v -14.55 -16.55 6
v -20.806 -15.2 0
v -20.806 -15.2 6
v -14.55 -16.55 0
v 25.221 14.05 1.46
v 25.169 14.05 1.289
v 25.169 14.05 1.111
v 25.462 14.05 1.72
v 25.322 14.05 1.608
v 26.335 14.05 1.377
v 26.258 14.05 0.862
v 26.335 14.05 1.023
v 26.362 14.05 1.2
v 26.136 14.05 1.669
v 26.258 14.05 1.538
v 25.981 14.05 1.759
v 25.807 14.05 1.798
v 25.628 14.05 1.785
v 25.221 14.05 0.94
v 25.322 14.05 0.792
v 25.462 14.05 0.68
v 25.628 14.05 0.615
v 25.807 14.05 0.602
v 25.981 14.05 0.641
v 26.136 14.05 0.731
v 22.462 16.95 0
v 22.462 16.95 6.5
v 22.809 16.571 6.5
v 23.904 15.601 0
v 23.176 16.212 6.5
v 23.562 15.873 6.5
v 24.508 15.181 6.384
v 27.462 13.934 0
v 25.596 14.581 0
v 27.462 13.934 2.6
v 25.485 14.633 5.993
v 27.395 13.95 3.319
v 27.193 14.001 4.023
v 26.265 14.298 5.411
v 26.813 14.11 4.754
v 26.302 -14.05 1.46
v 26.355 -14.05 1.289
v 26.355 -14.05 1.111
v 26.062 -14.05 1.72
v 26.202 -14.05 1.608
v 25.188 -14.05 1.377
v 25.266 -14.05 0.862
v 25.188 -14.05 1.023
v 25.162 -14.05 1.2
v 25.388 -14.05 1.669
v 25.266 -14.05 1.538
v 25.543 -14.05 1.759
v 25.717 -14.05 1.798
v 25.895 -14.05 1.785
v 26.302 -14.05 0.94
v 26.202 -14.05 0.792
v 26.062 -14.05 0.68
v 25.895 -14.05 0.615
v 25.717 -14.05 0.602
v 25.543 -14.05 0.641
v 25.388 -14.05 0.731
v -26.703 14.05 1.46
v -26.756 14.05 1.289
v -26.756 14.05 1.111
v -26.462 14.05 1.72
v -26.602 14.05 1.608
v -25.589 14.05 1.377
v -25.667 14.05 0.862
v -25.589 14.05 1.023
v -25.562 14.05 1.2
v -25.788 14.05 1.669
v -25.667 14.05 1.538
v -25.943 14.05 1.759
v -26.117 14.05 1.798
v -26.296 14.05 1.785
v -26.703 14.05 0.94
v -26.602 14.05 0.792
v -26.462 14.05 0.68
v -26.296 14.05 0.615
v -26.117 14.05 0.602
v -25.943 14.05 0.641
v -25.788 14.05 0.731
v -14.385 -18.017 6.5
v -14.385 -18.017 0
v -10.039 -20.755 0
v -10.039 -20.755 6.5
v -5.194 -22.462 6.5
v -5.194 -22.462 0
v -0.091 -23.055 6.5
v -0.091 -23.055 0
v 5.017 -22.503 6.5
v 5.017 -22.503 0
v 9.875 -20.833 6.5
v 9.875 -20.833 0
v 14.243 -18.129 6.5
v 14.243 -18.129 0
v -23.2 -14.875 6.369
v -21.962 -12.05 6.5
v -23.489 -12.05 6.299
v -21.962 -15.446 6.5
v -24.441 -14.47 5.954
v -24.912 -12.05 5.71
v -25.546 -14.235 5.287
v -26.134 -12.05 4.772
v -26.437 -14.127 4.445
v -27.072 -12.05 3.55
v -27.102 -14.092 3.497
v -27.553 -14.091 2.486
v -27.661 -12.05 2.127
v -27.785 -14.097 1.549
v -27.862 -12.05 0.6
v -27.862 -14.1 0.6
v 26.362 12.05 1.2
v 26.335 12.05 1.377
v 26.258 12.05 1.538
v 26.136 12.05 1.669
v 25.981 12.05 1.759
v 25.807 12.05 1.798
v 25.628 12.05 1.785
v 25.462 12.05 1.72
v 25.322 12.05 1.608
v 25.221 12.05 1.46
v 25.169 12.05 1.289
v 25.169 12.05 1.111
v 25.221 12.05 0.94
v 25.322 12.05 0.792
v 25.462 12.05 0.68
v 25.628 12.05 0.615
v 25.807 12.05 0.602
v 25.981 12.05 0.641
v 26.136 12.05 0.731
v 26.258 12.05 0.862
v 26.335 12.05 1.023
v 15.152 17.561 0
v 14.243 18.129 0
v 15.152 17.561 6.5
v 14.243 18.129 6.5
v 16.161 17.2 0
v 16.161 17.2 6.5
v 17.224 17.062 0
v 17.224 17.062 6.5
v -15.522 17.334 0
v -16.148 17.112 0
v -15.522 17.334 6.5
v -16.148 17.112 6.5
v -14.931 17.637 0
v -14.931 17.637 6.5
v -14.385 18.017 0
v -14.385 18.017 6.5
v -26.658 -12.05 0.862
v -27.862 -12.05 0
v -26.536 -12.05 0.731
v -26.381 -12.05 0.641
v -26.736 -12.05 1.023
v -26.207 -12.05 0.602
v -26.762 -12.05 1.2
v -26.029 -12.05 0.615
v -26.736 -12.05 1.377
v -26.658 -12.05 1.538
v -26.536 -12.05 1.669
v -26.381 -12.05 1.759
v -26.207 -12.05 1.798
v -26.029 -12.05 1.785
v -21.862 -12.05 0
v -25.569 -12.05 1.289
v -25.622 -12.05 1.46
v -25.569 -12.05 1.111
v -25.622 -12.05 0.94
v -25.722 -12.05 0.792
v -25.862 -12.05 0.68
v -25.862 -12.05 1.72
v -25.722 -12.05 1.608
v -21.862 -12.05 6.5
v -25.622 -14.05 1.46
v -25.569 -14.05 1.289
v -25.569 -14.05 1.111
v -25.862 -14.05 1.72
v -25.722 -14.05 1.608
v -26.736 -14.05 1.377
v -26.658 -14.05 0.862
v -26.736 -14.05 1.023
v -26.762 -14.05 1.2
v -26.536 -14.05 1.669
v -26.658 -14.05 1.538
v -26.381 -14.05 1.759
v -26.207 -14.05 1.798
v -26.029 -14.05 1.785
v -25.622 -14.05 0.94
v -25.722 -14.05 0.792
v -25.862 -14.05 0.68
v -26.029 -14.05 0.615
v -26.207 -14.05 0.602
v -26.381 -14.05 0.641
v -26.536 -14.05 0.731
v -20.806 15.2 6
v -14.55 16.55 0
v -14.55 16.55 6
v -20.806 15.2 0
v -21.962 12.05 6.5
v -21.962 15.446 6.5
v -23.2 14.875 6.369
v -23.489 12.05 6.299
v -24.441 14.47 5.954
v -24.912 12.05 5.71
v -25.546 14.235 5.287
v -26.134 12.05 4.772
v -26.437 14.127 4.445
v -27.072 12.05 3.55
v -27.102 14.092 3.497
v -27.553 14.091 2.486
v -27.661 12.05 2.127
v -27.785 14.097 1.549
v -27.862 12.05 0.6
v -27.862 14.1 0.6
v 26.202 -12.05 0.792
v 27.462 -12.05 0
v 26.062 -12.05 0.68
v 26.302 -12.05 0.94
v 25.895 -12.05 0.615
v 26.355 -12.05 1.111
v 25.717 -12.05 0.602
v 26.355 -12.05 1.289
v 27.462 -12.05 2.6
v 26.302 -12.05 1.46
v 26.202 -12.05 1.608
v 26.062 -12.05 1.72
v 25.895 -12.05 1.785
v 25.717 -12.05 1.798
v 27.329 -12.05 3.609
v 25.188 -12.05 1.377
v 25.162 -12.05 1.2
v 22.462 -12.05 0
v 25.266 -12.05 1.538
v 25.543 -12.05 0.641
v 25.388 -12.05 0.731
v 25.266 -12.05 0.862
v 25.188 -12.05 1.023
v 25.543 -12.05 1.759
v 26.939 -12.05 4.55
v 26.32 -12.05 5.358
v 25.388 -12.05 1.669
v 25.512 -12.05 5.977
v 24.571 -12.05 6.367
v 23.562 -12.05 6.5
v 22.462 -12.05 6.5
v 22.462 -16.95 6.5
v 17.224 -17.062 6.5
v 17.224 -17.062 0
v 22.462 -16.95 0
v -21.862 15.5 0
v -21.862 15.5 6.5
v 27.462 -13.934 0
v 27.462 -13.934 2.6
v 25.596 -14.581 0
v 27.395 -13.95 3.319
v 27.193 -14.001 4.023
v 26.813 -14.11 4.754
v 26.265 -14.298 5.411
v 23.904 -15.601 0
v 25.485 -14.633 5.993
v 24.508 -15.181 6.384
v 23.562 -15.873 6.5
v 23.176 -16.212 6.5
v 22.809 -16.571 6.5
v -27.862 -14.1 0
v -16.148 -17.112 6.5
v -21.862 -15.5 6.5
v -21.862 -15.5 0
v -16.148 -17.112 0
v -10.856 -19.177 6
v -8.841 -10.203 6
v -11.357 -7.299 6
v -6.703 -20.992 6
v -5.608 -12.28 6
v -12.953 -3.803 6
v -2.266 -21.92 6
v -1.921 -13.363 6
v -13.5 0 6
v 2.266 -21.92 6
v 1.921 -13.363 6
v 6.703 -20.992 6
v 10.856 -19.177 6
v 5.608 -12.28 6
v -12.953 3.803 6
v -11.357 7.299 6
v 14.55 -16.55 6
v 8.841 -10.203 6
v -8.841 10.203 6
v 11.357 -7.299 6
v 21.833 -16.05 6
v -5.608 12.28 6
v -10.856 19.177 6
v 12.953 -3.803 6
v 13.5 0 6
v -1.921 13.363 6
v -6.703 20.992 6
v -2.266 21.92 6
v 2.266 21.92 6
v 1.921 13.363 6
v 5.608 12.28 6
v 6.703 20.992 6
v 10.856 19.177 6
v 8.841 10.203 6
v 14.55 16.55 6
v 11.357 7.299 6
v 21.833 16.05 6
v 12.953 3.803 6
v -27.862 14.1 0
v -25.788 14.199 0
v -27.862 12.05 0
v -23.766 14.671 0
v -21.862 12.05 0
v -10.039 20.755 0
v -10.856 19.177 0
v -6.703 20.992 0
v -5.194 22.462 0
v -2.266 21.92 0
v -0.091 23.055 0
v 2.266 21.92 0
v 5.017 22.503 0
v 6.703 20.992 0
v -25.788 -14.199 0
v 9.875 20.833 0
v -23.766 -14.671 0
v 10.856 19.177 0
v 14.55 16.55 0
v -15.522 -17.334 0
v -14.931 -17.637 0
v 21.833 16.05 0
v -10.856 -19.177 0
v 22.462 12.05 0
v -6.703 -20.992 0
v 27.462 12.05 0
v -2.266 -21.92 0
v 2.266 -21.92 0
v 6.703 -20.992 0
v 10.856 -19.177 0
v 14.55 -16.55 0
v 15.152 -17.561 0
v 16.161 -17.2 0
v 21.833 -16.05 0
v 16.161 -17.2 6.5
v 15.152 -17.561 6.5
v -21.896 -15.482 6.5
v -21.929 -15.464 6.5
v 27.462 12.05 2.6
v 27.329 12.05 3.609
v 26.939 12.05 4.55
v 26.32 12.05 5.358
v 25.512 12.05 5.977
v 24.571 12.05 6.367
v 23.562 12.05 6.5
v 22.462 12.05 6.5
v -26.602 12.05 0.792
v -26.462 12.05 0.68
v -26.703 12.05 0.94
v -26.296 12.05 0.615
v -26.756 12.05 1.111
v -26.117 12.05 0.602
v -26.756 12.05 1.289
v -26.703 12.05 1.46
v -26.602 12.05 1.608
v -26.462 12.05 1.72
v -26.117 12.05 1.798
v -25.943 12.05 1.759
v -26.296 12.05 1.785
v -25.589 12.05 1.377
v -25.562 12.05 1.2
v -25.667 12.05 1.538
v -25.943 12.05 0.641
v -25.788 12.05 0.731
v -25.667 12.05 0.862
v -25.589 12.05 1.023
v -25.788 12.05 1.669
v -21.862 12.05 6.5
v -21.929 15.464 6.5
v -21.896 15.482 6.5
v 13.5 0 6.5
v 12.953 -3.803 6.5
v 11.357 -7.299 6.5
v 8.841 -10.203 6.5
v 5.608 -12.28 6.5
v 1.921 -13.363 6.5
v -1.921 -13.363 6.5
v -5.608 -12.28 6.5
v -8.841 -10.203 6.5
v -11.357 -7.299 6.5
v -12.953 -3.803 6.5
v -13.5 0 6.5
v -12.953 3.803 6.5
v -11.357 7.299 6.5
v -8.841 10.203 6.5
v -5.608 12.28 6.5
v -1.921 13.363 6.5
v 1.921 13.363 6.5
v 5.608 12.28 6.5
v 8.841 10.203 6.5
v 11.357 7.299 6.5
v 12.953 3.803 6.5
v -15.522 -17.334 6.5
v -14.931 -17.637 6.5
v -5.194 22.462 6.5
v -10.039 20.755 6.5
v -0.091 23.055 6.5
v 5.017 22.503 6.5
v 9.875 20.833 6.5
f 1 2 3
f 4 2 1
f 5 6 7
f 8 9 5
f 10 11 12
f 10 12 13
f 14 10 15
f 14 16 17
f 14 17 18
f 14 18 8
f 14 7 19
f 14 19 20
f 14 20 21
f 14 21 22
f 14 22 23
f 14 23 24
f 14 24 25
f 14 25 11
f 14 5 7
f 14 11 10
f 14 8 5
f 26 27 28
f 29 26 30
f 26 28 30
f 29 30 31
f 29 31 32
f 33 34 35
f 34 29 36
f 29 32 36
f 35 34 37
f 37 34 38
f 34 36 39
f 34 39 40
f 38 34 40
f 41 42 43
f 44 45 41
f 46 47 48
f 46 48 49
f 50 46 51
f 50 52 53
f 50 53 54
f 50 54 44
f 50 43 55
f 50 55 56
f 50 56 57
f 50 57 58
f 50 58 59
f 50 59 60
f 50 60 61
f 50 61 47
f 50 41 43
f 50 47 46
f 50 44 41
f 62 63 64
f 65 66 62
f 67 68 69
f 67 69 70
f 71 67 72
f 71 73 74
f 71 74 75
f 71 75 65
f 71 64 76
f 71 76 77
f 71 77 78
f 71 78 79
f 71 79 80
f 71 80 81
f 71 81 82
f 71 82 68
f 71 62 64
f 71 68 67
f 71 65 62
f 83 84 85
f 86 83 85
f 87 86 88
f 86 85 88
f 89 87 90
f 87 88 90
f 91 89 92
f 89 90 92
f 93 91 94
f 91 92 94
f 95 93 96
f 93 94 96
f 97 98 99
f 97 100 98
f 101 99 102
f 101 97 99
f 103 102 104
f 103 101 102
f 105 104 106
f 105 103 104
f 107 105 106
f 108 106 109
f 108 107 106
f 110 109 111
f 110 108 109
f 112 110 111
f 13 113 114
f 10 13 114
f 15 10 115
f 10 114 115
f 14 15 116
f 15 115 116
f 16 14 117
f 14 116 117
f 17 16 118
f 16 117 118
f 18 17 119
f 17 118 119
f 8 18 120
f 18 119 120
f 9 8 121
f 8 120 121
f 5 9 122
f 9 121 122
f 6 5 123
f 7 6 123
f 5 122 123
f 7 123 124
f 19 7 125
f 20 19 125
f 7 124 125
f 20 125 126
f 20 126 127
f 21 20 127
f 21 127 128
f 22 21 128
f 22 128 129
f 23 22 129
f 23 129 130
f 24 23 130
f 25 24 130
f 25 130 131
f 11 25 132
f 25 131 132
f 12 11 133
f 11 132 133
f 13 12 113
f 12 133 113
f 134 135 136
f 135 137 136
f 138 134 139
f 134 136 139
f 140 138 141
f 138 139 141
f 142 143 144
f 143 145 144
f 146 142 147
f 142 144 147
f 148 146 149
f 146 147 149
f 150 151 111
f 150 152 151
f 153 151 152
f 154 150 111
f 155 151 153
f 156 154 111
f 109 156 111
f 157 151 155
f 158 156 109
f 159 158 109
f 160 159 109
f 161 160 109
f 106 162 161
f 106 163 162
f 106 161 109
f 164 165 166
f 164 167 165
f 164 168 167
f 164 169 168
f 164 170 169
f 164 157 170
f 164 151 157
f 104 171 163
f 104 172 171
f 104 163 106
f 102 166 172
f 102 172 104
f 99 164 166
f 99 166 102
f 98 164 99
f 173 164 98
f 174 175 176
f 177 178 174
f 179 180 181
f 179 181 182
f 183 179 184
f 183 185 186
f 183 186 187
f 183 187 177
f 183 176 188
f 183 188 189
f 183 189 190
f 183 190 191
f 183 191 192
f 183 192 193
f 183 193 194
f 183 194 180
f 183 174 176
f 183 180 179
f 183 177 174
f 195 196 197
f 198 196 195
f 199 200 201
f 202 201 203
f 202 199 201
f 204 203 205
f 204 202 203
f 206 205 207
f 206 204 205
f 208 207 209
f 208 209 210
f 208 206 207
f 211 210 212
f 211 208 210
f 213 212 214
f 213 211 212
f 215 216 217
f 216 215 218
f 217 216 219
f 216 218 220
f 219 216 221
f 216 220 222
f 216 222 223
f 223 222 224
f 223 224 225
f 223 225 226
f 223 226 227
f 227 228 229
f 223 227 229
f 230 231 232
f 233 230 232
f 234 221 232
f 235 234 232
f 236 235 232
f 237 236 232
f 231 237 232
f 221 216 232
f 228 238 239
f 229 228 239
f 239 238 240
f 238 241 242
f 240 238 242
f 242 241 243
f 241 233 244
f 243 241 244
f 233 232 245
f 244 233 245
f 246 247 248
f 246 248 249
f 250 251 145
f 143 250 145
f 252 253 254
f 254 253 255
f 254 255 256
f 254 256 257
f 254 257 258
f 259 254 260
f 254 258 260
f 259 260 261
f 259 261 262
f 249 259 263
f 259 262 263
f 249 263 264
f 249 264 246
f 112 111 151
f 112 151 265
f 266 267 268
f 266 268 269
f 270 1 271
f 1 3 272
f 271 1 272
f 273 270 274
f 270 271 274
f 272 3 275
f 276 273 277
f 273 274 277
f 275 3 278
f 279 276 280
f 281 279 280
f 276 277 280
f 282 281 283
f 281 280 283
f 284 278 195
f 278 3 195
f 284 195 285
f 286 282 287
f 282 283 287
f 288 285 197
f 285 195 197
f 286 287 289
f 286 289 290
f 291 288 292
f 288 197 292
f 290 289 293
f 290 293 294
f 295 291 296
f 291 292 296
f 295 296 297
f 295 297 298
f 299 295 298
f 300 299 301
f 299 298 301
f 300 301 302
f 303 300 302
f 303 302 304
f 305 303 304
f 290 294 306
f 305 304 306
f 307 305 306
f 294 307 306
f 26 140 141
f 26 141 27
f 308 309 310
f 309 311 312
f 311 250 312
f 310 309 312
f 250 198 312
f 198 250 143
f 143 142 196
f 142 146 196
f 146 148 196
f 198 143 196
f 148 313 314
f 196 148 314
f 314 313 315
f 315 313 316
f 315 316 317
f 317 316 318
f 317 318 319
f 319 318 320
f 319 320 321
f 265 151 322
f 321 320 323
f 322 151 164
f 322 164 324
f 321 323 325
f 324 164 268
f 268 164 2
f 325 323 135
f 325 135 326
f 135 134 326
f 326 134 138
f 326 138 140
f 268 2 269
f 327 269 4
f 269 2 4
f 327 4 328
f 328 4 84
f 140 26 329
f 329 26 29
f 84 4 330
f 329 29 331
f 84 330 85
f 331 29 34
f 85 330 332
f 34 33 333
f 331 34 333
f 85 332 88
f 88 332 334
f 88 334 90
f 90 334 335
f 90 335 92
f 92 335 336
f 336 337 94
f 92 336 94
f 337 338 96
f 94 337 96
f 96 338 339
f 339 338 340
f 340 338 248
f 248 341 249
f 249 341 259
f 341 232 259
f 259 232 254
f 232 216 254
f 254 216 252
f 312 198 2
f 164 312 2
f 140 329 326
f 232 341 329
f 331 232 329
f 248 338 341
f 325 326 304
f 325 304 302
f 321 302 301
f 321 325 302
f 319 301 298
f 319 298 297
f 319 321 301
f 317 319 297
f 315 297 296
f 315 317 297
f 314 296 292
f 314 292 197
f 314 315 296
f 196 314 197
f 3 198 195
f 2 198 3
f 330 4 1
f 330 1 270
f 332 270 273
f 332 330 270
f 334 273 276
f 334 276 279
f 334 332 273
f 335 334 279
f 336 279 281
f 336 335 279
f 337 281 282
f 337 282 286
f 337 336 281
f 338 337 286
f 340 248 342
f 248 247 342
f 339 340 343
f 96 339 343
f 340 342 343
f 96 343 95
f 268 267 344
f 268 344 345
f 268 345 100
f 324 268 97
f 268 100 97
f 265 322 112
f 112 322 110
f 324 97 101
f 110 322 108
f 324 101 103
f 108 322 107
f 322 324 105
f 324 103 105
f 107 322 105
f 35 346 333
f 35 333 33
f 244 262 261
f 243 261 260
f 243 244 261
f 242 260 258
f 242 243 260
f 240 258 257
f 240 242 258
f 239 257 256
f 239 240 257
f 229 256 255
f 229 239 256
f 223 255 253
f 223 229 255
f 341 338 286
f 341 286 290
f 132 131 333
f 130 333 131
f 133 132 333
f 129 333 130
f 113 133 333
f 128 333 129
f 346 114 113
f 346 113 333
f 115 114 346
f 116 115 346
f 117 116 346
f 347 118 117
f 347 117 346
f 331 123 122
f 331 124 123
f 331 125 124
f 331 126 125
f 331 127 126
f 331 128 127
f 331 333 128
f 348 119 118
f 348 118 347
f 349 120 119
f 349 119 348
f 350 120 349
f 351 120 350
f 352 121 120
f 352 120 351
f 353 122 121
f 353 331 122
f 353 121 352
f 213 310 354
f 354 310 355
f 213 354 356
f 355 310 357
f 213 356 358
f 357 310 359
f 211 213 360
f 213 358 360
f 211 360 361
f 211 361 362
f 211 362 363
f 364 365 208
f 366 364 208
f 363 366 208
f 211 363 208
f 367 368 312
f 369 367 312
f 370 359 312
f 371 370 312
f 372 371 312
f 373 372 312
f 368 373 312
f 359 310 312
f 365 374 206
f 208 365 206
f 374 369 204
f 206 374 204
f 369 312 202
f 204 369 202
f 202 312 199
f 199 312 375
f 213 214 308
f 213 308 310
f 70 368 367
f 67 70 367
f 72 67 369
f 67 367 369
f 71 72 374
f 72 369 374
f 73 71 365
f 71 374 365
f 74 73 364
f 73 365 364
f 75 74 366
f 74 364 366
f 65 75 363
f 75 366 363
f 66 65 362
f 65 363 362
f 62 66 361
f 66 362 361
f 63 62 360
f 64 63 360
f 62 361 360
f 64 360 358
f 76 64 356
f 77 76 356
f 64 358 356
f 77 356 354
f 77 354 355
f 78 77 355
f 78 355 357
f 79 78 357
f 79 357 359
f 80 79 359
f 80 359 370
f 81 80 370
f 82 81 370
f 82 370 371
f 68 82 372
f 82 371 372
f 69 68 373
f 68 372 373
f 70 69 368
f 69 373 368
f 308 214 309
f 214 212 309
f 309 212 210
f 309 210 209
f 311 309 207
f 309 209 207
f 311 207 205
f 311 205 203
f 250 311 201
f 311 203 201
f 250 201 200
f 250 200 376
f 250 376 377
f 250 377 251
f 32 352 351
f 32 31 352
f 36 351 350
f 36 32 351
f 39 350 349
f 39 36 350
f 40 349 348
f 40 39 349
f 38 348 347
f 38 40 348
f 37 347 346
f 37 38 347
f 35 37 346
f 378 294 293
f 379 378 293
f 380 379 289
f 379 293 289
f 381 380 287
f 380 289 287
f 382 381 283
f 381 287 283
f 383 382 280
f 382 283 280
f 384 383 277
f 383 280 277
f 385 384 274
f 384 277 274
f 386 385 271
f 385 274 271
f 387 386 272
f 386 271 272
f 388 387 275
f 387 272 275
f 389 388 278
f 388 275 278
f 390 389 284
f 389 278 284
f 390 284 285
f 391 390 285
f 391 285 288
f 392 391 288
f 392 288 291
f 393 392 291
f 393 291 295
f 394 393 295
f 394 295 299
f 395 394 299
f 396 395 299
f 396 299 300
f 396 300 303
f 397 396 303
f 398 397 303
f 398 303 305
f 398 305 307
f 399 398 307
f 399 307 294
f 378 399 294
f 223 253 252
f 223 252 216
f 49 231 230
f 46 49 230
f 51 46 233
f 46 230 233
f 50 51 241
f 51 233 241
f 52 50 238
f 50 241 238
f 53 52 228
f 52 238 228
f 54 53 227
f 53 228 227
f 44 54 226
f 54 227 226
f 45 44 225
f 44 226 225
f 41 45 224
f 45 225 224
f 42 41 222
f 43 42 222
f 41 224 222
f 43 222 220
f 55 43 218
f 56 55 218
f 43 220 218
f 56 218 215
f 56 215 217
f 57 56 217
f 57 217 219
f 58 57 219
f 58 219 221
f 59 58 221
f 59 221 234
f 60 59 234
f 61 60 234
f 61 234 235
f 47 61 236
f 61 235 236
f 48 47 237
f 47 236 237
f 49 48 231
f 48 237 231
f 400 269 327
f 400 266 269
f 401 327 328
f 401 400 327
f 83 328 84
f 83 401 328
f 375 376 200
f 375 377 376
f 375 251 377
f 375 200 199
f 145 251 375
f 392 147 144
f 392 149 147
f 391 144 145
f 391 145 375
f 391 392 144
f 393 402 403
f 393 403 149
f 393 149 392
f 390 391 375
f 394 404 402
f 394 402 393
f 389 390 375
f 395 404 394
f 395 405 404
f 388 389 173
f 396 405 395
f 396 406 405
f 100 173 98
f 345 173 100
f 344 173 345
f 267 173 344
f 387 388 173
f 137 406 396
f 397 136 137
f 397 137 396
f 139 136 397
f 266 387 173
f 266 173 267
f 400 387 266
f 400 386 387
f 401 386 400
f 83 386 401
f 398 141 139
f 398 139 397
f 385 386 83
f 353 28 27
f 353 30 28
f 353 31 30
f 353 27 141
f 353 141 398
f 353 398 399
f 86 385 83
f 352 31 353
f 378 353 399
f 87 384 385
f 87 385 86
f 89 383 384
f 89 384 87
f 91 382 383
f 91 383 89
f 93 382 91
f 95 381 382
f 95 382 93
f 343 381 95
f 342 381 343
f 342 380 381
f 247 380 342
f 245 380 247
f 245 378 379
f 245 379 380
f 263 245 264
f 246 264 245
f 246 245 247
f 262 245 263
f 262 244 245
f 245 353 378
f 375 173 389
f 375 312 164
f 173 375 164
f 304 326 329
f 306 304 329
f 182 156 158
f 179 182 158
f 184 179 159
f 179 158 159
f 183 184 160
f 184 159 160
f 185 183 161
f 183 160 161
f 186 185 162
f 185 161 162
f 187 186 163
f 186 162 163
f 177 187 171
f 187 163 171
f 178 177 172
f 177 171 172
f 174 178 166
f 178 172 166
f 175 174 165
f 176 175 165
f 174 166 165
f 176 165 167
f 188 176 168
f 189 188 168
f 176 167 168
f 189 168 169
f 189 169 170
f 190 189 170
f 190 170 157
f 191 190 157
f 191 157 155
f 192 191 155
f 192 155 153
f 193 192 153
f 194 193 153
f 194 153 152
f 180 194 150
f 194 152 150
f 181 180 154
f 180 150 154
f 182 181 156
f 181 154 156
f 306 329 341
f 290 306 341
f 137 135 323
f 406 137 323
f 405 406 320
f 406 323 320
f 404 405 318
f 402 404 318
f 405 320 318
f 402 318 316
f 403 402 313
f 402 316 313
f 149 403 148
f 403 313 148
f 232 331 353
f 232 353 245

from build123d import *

# Parameters (mm, degrees)
PAD_DEPTH       = 6.5
POCKET_DEPTH    = 6
SKETCH002_R     = 13.5
POCKET001_DEPTH = 1
SKETCH003_W     = 4.9
SKETCH003_H     = 6.5
PAD001_DEPTH    = 5
POCKET002_DEPTH = 10
SKETCH008_R     = 0.6
POCKET003_DEPTH = 2
SKETCH009_R     = 0.6
POCKET004_DEPTH = 2
FILLET_R        = 3.9
FILLET001_R     = 3.9
FILLET002_R     = 5
FILLET003_R     = 5
FILLET004_R     = 5
FILLET005_R     = 5
SKETCH010_W     = 3.45
SKETCH010_H     = 6.5
PAD002_DEPTH    = 6
POCKET005_DEPTH = 10
SKETCH012_R     = 0.6
POCKET006_DEPTH = 2
SKETCH013_R     = 0.6
POCKET007_DEPTH = 2
FILLET006_R     = 5.9
FILLET007_R     = 5.9


with BuildPart() as part:
    # Sketch → Pad (new body)
    with BuildSketch(Plane.XY):
        with BuildLine():
            Line((-21.862293, 15.5), (-21.862293, -15.5))
            Line((-21.862293, -15.5), (-15.125083, -17.4))
            ThreePointArc((-15.125083, -17.4), (0.226102, -23.053785), (15.463446, -17.1))
            Line((15.463446, -17.1), (22.461838, -16.95))
            Line((22.461838, 16.95), (22.461838, -16.95))
            Line((15.463446, 17.1), (22.461838, 16.95))
            ThreePointArc((15.463446, 17.1), (0.226102, 23.053785), (-15.125083, 17.4))
            Line((-21.862293, 15.5), (-15.125083, 17.4))
        make_face()
    extrude(amount=PAD_DEPTH)

    # Sketch001 → Pocket (cut)
    with BuildSketch(Plane.XY):
        with BuildLine():
            Line((-14.55, 16.55), (-20.805997, 15.2))
            Line((-20.805997, 15.2), (-20.805997, -15.2))
            Line((-20.805997, -15.2), (-14.55, -16.55))
            ThreePointArc((-14.55, -16.55), (0, -22.036447), (14.55, -16.55))
            Line((14.55, -16.55), (21.832857, -16.05))
            Line((21.832857, 16.05), (21.832857, -16.05))
            Line((14.55, 16.55), (21.832857, 16.05))
            ThreePointArc((14.55, 16.55), (0, 22.036447), (-14.55, 16.55))
        make_face()
    extrude(amount=POCKET_DEPTH, mode=Mode.SUBTRACT)

    # Sketch002 (on Face19 of Pocket) → Pocket001 (cut)
    with BuildSketch(Plane(origin=(0, 0, 6), x_dir=(1, 0, 0), z_dir=(0, 0, -1))):
        Circle(SKETCH002_R)
    extrude(amount=-POCKET001_DEPTH, mode=Mode.SUBTRACT)

    # Sketch003 (on Face6 of Pocket001) → Pad001 (join)
    with BuildSketch(Plane.YZ.offset(22.461838)):
        with Locations((-14.5, 3.25)):
            Rectangle(SKETCH003_W, SKETCH003_H)
        with Locations((14.5, 3.25)):
            Rectangle(SKETCH003_W, SKETCH003_H)
    extrude(amount=PAD001_DEPTH)

    # Sketch006 → Pocket002 (cut)
    with BuildSketch(Plane.XY.offset(10)):
        with BuildLine():
            ThreePointArc((22.461838, 16.95), (24.723382, 15.046575), (27.461838, 13.93371))
            Line((27.461838, 16.95), (27.461838, 13.93371))
            Line((27.461838, 16.95), (22.461838, 16.95))
        make_face()
        with BuildLine():
            ThreePointArc((27.461838, -13.93371), (24.723382, -15.046575), (22.461838, -16.95))
            Line((27.461838, -16.95), (22.461838, -16.95))
            Line((27.461838, -13.93371), (27.461838, -16.95))
        make_face()
    extrude(amount=-POCKET002_DEPTH, mode=Mode.SUBTRACT)

    # Sketch008 (on Face27 of Pocket002) → Pocket003 (cut)
    with BuildSketch(Plane(origin=(0, -12.05, 0), x_dir=(-1, 0, 0), z_dir=(0, 1, 0))):
        with Locations((-25.761838, 1.2)):
            Circle(SKETCH008_R)
    extrude(amount=-POCKET003_DEPTH, mode=Mode.SUBTRACT)

    # Sketch009 (on Face26 of Pocket003) → Pocket004 (cut)
    with BuildSketch(Plane.XZ.offset(-12.05)):
        with Locations((25.761838, 1.2)):
            Circle(SKETCH009_R)
    extrude(amount=-POCKET004_DEPTH, mode=Mode.SUBTRACT)

    # Fillet
    fillet_edges = [part.edges().sort_by_distance(p)[0] for p in [
        (27.461838, -12.991855, 6.5),
    ]]
    fillet(fillet_edges, radius=FILLET_R)

    # Fillet001
    fillet001_edges = [part.edges().sort_by_distance(p)[0] for p in [
        (27.461838, 12.991855, 6.5),
    ]]
    fillet(fillet001_edges, radius=FILLET001_R)

    # Fillet002
    fillet002_edges = [part.edges().sort_by_distance(p)[0] for p in [
        (15.463446, -17.1, 3.25),
    ]]
    fillet(fillet002_edges, radius=FILLET002_R)

    # Fillet003
    fillet003_edges = [part.edges().sort_by_distance(p)[0] for p in [
        (15.463446, 17.1, 3.25),
    ]]
    fillet(fillet003_edges, radius=FILLET003_R)

    # Fillet004
    fillet004_edges = [part.edges().sort_by_distance(p)[0] for p in [
        (-15.125083, -17.4, 3.25),
    ]]
    fillet(fillet004_edges, radius=FILLET004_R)

    # Fillet005
    fillet005_edges = [part.edges().sort_by_distance(p)[0] for p in [
        (-15.125083, 17.4, 3.25),
    ]]
    fillet(fillet005_edges, radius=FILLET005_R)

    # Sketch010 (on Face4 of Fillet005) → Pad002 (join)
    with BuildSketch(Plane(origin=(-21.862293, 0, 0), x_dir=(0, -1, 0), z_dir=(-1, 0, 0))):
        with Locations((-13.775, 3.25)):
            Rectangle(SKETCH010_W, SKETCH010_H)
        with Locations((13.775, 3.25)):
            Rectangle(SKETCH010_W, SKETCH010_H)
    extrude(amount=PAD002_DEPTH)

    # Sketch011 (on Face6 of Pad002) → Pocket005 (cut)
    with BuildSketch(Plane.XY.offset(6.5)):
        with BuildLine():
            ThreePointArc((-27.862293, 14.1), (-24.766364, 14.388874), (-21.862293, 15.5))
            Line((-21.862293, 15.5), (-27.862293, 15.5))
            Line((-27.862293, 15.5), (-27.862293, 14.1))
        make_face()
        with BuildLine():
            ThreePointArc((-21.862293, -15.5), (-24.766364, -14.388874), (-27.862293, -14.1))
            Line((-27.862293, -14.1), (-27.862293, -15.5))
            Line((-27.862293, -15.5), (-21.862293, -15.5))
        make_face()
    extrude(amount=-POCKET005_DEPTH, mode=Mode.SUBTRACT)

    # Sketch012 (on Face23 of Pocket005) → Pocket006 (cut)
    with BuildSketch(Plane(origin=(0, -12.05, 0), x_dir=(-1, 0, 0), z_dir=(0, 1, 0))):
        with Locations((26.162293, 1.2)):
            Circle(SKETCH012_R)
    extrude(amount=-POCKET006_DEPTH, mode=Mode.SUBTRACT)

    # Sketch013 (on Face21 of Pocket006) → Pocket007 (cut)
    with BuildSketch(Plane.XZ.offset(-12.05)):
        with Locations((-26.162293, 1.2)):
            Circle(SKETCH013_R)
    extrude(amount=-POCKET007_DEPTH, mode=Mode.SUBTRACT)

    # Fillet006
    fillet006_edges = [part.edges().sort_by_distance(p)[0] for p in [
        (-27.862293, 13.075, 6.5),
    ]]
    fillet(fillet006_edges, radius=FILLET006_R)

    # Fillet007
    fillet007_edges = [part.edges().sort_by_distance(p)[0] for p in [
        (-27.862293, -13.075, 6.5),
    ]]
    fillet(fillet007_edges, radius=FILLET007_R)


solid = part.part
